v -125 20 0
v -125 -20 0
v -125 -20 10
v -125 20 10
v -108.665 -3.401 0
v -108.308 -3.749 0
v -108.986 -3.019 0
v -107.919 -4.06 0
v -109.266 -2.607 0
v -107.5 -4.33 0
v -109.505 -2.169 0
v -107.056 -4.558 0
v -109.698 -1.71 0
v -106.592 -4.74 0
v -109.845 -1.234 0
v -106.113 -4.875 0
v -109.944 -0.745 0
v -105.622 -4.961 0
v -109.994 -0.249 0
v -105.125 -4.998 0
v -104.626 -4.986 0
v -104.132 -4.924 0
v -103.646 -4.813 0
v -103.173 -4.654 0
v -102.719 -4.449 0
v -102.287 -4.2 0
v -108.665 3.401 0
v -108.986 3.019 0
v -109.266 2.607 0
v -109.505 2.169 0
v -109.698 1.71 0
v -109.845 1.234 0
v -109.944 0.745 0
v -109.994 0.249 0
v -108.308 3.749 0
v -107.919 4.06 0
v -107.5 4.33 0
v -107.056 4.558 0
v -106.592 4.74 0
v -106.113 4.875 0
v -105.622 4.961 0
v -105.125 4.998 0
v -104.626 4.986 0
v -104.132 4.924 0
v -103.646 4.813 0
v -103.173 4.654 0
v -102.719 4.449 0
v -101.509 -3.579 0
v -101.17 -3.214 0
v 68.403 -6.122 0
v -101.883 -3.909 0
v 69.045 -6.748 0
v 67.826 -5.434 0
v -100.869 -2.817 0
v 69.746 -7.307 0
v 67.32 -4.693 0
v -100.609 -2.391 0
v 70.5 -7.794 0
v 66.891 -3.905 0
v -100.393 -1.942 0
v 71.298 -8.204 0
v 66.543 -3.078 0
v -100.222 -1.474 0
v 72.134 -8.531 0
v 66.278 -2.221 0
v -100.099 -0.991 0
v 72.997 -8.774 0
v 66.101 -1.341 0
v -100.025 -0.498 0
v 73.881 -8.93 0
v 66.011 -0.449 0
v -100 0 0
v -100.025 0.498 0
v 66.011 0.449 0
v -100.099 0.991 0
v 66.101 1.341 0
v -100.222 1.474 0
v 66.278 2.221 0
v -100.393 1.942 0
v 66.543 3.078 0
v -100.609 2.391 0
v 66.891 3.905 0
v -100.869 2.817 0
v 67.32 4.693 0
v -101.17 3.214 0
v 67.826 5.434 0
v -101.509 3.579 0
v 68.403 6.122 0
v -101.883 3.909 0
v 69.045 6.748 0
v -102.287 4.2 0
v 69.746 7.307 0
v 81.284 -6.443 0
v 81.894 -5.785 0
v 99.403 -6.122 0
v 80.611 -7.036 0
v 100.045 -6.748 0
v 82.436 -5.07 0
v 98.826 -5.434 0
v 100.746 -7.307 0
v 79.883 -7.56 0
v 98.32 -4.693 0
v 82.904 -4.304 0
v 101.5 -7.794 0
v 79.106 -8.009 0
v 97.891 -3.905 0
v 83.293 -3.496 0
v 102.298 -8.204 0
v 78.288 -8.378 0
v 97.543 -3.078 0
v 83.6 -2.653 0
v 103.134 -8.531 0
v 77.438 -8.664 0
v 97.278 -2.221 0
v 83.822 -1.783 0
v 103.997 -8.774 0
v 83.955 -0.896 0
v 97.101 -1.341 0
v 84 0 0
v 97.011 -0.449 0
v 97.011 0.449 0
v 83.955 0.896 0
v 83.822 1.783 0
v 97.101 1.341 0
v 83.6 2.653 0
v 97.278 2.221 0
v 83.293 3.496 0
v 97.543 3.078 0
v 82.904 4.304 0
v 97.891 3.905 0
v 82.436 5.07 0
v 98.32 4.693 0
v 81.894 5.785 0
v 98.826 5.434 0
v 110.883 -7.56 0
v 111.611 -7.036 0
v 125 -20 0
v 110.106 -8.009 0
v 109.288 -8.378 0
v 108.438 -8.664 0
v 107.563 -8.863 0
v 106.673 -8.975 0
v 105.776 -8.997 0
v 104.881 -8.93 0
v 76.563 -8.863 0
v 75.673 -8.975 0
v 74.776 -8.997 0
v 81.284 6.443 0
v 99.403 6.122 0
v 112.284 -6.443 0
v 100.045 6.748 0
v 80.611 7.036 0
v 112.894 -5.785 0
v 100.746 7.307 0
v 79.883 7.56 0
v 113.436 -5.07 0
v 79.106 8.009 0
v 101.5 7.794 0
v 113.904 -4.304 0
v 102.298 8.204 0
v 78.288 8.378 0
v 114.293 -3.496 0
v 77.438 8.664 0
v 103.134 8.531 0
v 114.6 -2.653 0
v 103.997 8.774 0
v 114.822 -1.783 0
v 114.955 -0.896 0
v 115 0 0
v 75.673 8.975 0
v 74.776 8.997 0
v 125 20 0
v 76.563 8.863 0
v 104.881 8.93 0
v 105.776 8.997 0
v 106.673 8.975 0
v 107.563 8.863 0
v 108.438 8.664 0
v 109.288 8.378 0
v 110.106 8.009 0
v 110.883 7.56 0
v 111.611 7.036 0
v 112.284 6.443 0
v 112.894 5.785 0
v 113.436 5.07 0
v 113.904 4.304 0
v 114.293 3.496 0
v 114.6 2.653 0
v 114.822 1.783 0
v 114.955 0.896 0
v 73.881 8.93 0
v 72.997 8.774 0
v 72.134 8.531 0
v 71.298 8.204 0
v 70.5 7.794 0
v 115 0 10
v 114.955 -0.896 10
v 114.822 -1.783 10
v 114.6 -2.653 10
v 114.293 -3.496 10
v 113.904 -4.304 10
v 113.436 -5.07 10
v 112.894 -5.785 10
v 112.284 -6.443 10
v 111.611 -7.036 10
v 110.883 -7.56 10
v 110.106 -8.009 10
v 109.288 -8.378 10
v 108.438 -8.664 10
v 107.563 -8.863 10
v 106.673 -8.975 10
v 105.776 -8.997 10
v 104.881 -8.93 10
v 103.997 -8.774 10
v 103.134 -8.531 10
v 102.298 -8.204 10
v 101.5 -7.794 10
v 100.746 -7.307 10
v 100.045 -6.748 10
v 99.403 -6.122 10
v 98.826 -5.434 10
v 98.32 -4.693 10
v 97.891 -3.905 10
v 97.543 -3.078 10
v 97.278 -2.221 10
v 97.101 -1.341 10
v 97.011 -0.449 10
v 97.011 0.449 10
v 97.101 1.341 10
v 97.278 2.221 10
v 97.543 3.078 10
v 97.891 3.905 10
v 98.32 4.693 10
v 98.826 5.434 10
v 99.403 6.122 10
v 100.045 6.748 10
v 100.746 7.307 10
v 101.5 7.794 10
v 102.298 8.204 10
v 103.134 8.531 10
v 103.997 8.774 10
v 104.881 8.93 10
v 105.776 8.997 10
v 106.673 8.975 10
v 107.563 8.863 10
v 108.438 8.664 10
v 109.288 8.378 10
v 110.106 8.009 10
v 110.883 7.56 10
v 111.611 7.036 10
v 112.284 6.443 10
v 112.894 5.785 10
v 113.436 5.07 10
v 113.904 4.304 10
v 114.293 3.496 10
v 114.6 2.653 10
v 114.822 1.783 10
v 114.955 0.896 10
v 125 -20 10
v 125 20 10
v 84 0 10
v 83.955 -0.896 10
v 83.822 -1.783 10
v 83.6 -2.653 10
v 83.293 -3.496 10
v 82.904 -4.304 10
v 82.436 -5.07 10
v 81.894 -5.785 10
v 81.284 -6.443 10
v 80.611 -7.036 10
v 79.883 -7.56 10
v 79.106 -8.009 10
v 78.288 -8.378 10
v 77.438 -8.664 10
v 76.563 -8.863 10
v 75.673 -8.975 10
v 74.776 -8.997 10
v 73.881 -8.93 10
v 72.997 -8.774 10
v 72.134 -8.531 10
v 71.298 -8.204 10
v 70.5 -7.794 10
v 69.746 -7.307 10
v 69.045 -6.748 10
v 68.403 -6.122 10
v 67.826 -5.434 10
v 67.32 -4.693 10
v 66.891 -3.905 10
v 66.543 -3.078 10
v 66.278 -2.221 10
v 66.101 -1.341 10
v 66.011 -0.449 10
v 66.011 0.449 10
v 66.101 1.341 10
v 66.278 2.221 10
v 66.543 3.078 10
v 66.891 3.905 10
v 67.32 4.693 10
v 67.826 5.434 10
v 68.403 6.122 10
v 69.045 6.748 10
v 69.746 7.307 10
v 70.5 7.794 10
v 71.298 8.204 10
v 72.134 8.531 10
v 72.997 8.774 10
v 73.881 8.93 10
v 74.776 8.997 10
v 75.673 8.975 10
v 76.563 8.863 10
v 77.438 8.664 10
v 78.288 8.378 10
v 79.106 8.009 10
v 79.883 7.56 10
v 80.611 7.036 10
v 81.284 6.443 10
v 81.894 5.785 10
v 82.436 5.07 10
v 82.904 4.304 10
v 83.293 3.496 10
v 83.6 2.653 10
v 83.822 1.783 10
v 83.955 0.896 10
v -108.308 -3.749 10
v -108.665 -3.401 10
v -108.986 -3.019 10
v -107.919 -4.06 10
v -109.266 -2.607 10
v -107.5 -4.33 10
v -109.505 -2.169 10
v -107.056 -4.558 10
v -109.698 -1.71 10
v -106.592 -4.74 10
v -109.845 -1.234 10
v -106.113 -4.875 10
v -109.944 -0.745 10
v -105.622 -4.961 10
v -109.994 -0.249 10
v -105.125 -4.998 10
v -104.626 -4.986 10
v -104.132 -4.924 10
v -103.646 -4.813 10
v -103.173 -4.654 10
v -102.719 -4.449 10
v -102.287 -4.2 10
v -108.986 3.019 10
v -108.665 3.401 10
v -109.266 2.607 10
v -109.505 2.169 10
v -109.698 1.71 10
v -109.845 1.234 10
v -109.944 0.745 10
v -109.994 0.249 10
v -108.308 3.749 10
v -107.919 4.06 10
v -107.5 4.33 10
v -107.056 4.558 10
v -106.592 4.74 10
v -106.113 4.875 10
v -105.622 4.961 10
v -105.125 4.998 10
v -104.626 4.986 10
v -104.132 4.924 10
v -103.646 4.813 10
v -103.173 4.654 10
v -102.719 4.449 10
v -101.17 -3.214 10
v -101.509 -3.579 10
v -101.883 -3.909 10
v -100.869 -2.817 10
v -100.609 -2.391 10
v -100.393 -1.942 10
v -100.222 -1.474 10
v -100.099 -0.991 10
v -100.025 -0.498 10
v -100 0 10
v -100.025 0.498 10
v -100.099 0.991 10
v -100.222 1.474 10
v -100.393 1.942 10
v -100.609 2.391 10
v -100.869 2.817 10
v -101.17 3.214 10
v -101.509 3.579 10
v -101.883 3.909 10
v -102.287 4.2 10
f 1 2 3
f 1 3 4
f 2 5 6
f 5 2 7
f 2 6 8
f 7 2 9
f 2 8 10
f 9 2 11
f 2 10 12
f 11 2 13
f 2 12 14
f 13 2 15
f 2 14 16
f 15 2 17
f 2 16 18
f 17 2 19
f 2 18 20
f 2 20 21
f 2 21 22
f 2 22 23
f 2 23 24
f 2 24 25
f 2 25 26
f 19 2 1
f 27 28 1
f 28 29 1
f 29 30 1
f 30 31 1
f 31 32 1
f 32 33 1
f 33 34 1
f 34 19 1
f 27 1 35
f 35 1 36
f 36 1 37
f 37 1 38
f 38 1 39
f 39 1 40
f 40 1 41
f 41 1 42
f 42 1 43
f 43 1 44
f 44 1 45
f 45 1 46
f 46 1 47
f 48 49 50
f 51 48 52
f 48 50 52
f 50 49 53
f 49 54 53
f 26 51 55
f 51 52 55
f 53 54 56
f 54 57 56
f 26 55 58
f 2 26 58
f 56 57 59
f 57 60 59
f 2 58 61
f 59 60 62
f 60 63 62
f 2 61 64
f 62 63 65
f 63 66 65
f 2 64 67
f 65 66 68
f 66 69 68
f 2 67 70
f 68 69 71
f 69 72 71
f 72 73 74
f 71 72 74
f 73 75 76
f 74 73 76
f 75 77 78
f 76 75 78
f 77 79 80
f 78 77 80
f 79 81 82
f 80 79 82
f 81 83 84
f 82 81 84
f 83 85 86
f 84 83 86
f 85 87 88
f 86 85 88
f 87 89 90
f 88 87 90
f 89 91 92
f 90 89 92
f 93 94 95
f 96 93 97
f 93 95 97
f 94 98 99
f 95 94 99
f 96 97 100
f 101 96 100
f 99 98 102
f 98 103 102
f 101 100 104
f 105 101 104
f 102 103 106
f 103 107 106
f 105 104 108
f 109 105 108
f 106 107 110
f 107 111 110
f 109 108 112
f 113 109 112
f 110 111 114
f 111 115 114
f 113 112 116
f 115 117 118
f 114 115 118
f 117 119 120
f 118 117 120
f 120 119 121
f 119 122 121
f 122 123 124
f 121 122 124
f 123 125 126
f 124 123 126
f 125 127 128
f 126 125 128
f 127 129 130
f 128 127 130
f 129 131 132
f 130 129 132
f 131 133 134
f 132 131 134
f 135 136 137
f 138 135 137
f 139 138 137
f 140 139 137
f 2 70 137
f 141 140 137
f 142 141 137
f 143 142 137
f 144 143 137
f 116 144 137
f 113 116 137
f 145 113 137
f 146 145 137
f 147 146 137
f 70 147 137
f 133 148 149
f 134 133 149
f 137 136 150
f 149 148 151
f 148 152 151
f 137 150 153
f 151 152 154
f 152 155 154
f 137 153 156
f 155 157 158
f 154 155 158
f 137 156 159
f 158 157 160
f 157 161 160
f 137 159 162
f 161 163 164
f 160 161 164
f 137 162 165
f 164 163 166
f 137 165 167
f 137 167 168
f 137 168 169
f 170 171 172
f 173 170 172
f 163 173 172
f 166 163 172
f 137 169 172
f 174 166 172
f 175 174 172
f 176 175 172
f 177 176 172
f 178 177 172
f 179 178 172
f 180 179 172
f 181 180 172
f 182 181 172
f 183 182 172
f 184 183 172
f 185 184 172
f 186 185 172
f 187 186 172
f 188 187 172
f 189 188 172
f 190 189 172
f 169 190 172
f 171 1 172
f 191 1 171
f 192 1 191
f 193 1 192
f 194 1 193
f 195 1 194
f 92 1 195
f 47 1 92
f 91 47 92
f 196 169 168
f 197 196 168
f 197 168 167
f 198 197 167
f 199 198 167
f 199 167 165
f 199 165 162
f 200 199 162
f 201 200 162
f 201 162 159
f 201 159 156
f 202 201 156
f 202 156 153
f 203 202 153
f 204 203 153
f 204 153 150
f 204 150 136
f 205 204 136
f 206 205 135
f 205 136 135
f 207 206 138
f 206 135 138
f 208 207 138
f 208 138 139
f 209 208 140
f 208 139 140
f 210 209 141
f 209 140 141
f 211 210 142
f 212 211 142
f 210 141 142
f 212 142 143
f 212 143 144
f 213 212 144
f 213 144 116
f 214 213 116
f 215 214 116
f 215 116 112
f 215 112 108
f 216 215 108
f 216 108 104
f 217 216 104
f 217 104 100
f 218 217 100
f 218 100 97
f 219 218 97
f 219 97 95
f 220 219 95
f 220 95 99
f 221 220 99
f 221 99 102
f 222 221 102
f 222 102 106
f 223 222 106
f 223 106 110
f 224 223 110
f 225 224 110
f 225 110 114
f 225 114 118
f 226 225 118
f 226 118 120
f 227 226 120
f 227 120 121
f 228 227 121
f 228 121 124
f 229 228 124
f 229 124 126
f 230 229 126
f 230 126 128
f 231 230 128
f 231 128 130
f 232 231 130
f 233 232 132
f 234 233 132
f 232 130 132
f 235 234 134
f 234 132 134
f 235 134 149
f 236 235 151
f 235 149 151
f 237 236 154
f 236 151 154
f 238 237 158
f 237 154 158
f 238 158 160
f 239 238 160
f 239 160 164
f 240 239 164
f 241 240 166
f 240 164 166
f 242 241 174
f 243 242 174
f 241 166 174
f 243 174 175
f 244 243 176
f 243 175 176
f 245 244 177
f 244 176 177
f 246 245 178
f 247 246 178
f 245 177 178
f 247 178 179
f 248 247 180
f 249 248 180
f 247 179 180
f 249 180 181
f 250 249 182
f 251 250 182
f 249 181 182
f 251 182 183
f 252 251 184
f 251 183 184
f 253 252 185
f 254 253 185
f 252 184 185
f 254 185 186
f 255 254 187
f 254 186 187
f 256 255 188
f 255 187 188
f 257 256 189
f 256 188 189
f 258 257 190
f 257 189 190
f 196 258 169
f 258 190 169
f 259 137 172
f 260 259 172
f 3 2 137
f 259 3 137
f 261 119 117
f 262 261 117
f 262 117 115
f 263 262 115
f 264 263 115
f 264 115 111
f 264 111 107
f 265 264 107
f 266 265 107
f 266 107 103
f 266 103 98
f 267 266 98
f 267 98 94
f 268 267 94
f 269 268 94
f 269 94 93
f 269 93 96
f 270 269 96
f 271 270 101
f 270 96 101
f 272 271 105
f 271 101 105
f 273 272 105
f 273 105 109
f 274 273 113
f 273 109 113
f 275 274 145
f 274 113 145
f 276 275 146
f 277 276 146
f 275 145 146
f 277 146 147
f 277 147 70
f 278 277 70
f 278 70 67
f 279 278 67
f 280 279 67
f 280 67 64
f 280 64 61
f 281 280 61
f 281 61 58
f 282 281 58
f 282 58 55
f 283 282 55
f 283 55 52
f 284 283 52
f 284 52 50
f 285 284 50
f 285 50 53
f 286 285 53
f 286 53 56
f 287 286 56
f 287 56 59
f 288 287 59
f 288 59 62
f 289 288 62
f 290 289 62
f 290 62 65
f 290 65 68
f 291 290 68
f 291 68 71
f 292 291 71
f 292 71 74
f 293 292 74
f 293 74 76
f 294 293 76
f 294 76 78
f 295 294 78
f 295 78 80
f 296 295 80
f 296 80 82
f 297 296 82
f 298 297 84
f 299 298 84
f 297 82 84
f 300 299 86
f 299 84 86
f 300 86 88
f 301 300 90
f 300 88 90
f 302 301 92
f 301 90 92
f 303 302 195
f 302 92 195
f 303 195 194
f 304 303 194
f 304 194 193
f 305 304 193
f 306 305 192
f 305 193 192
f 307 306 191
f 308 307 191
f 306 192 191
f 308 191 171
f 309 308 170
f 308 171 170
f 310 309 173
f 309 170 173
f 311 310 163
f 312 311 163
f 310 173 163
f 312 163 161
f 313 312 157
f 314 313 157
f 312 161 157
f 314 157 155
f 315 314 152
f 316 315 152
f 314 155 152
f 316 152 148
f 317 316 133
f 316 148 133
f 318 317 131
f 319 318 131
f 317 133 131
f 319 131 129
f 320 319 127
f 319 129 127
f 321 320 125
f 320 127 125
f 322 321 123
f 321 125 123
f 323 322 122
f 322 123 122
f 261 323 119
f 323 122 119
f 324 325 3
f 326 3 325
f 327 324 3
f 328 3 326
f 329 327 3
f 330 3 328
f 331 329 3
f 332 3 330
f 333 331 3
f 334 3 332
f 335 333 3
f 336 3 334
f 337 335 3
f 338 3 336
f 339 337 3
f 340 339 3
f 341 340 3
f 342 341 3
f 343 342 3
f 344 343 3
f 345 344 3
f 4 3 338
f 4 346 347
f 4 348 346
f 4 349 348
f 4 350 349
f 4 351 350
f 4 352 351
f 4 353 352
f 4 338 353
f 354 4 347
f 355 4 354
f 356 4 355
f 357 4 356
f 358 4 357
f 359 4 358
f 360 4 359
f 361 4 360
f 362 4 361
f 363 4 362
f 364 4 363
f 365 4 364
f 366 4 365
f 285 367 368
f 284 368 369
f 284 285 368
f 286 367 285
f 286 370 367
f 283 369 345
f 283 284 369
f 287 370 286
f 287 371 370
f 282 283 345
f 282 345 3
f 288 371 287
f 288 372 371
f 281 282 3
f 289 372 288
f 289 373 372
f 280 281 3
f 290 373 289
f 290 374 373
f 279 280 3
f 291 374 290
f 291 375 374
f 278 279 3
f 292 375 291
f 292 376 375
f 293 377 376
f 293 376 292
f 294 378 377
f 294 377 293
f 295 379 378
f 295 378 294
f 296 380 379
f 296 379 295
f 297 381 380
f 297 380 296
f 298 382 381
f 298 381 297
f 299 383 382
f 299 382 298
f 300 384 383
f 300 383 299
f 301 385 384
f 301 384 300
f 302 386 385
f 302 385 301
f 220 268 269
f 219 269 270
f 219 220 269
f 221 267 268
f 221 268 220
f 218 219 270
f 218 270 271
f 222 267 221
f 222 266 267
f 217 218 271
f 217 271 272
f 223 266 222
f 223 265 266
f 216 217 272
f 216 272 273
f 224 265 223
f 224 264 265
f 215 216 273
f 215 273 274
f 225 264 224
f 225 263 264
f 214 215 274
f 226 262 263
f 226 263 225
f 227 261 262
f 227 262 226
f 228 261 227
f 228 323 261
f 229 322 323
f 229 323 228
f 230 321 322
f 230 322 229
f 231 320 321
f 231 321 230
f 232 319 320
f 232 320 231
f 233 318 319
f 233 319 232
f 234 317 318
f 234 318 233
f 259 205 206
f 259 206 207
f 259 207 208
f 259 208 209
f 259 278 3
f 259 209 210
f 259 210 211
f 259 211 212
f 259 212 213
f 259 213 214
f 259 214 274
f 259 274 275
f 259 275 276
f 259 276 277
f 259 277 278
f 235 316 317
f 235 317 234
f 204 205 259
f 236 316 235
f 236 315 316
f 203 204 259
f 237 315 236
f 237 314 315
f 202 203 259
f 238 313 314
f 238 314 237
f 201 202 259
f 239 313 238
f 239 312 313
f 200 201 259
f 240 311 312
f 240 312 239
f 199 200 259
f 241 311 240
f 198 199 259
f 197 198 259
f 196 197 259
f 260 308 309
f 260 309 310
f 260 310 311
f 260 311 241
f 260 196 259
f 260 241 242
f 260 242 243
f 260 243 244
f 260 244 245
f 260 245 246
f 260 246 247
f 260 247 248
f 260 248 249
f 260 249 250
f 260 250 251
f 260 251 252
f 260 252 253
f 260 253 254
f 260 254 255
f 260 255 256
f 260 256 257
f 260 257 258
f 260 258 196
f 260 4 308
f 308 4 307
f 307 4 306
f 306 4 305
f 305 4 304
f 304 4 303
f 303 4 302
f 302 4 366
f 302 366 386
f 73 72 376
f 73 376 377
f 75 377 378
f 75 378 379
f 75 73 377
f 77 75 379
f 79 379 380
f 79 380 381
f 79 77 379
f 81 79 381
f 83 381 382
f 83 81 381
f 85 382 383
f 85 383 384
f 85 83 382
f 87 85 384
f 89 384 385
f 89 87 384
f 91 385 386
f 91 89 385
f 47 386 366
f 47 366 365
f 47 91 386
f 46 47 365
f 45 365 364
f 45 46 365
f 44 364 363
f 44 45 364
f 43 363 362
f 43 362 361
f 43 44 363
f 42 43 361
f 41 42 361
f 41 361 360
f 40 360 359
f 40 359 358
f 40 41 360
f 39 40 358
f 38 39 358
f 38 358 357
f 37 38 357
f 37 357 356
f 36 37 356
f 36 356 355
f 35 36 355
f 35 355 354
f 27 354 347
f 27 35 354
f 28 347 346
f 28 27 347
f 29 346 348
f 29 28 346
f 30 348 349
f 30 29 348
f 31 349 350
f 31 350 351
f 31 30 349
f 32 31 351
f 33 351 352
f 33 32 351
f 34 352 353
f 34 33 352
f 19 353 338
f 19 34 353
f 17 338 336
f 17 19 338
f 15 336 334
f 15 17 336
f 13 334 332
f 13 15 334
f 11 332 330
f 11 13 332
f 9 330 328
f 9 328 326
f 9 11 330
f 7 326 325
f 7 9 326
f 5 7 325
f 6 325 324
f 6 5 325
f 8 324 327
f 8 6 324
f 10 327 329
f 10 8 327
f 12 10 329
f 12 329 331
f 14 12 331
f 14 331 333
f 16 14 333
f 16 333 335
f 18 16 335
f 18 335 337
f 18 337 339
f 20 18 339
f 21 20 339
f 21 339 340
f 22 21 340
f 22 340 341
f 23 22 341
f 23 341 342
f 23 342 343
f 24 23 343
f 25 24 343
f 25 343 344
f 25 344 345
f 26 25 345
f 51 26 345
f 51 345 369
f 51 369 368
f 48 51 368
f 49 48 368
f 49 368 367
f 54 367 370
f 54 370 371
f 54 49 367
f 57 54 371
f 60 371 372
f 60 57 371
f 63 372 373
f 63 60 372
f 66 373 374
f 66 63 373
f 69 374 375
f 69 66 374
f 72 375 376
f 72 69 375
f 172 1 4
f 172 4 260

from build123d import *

# Parameters (mm, degrees)
F0_W     = 250
F0_H     = 40
F0_R     = 5
F1_DEPTH = 10
F2_R     = 9
F3_DEPTH = 25
F4_R     = 9
F5_DEPTH = 25


with BuildPart() as f1:
    # F0 (on Top) → F1 (new body)
    with BuildSketch(Plane.XY):
        Rectangle(F0_W, F0_H)
        with Locations((-105, 0)):
            Circle(F0_R, mode=Mode.SUBTRACT)
    extrude(amount=F1_DEPTH)

    # F2 (on face) → F3 (cut)
    with BuildSketch(Plane(origin=(0, 0, 0), x_dir=(1, 0, 0), z_dir=(0, 0, -1))):
        with Locations((106, 0)):
            Circle(F2_R)
    extrude(amount=-F3_DEPTH, mode=Mode.SUBTRACT)

    # F4 (on face) → F5 (cut)
    with BuildSketch(Plane(origin=(0, 0, 0), x_dir=(1, 0, 0), z_dir=(0, 0, -1))):
        with Locations((75, 0)):
            Circle(F4_R)
    extrude(amount=-F5_DEPTH, mode=Mode.SUBTRACT)


solid = f1.part
